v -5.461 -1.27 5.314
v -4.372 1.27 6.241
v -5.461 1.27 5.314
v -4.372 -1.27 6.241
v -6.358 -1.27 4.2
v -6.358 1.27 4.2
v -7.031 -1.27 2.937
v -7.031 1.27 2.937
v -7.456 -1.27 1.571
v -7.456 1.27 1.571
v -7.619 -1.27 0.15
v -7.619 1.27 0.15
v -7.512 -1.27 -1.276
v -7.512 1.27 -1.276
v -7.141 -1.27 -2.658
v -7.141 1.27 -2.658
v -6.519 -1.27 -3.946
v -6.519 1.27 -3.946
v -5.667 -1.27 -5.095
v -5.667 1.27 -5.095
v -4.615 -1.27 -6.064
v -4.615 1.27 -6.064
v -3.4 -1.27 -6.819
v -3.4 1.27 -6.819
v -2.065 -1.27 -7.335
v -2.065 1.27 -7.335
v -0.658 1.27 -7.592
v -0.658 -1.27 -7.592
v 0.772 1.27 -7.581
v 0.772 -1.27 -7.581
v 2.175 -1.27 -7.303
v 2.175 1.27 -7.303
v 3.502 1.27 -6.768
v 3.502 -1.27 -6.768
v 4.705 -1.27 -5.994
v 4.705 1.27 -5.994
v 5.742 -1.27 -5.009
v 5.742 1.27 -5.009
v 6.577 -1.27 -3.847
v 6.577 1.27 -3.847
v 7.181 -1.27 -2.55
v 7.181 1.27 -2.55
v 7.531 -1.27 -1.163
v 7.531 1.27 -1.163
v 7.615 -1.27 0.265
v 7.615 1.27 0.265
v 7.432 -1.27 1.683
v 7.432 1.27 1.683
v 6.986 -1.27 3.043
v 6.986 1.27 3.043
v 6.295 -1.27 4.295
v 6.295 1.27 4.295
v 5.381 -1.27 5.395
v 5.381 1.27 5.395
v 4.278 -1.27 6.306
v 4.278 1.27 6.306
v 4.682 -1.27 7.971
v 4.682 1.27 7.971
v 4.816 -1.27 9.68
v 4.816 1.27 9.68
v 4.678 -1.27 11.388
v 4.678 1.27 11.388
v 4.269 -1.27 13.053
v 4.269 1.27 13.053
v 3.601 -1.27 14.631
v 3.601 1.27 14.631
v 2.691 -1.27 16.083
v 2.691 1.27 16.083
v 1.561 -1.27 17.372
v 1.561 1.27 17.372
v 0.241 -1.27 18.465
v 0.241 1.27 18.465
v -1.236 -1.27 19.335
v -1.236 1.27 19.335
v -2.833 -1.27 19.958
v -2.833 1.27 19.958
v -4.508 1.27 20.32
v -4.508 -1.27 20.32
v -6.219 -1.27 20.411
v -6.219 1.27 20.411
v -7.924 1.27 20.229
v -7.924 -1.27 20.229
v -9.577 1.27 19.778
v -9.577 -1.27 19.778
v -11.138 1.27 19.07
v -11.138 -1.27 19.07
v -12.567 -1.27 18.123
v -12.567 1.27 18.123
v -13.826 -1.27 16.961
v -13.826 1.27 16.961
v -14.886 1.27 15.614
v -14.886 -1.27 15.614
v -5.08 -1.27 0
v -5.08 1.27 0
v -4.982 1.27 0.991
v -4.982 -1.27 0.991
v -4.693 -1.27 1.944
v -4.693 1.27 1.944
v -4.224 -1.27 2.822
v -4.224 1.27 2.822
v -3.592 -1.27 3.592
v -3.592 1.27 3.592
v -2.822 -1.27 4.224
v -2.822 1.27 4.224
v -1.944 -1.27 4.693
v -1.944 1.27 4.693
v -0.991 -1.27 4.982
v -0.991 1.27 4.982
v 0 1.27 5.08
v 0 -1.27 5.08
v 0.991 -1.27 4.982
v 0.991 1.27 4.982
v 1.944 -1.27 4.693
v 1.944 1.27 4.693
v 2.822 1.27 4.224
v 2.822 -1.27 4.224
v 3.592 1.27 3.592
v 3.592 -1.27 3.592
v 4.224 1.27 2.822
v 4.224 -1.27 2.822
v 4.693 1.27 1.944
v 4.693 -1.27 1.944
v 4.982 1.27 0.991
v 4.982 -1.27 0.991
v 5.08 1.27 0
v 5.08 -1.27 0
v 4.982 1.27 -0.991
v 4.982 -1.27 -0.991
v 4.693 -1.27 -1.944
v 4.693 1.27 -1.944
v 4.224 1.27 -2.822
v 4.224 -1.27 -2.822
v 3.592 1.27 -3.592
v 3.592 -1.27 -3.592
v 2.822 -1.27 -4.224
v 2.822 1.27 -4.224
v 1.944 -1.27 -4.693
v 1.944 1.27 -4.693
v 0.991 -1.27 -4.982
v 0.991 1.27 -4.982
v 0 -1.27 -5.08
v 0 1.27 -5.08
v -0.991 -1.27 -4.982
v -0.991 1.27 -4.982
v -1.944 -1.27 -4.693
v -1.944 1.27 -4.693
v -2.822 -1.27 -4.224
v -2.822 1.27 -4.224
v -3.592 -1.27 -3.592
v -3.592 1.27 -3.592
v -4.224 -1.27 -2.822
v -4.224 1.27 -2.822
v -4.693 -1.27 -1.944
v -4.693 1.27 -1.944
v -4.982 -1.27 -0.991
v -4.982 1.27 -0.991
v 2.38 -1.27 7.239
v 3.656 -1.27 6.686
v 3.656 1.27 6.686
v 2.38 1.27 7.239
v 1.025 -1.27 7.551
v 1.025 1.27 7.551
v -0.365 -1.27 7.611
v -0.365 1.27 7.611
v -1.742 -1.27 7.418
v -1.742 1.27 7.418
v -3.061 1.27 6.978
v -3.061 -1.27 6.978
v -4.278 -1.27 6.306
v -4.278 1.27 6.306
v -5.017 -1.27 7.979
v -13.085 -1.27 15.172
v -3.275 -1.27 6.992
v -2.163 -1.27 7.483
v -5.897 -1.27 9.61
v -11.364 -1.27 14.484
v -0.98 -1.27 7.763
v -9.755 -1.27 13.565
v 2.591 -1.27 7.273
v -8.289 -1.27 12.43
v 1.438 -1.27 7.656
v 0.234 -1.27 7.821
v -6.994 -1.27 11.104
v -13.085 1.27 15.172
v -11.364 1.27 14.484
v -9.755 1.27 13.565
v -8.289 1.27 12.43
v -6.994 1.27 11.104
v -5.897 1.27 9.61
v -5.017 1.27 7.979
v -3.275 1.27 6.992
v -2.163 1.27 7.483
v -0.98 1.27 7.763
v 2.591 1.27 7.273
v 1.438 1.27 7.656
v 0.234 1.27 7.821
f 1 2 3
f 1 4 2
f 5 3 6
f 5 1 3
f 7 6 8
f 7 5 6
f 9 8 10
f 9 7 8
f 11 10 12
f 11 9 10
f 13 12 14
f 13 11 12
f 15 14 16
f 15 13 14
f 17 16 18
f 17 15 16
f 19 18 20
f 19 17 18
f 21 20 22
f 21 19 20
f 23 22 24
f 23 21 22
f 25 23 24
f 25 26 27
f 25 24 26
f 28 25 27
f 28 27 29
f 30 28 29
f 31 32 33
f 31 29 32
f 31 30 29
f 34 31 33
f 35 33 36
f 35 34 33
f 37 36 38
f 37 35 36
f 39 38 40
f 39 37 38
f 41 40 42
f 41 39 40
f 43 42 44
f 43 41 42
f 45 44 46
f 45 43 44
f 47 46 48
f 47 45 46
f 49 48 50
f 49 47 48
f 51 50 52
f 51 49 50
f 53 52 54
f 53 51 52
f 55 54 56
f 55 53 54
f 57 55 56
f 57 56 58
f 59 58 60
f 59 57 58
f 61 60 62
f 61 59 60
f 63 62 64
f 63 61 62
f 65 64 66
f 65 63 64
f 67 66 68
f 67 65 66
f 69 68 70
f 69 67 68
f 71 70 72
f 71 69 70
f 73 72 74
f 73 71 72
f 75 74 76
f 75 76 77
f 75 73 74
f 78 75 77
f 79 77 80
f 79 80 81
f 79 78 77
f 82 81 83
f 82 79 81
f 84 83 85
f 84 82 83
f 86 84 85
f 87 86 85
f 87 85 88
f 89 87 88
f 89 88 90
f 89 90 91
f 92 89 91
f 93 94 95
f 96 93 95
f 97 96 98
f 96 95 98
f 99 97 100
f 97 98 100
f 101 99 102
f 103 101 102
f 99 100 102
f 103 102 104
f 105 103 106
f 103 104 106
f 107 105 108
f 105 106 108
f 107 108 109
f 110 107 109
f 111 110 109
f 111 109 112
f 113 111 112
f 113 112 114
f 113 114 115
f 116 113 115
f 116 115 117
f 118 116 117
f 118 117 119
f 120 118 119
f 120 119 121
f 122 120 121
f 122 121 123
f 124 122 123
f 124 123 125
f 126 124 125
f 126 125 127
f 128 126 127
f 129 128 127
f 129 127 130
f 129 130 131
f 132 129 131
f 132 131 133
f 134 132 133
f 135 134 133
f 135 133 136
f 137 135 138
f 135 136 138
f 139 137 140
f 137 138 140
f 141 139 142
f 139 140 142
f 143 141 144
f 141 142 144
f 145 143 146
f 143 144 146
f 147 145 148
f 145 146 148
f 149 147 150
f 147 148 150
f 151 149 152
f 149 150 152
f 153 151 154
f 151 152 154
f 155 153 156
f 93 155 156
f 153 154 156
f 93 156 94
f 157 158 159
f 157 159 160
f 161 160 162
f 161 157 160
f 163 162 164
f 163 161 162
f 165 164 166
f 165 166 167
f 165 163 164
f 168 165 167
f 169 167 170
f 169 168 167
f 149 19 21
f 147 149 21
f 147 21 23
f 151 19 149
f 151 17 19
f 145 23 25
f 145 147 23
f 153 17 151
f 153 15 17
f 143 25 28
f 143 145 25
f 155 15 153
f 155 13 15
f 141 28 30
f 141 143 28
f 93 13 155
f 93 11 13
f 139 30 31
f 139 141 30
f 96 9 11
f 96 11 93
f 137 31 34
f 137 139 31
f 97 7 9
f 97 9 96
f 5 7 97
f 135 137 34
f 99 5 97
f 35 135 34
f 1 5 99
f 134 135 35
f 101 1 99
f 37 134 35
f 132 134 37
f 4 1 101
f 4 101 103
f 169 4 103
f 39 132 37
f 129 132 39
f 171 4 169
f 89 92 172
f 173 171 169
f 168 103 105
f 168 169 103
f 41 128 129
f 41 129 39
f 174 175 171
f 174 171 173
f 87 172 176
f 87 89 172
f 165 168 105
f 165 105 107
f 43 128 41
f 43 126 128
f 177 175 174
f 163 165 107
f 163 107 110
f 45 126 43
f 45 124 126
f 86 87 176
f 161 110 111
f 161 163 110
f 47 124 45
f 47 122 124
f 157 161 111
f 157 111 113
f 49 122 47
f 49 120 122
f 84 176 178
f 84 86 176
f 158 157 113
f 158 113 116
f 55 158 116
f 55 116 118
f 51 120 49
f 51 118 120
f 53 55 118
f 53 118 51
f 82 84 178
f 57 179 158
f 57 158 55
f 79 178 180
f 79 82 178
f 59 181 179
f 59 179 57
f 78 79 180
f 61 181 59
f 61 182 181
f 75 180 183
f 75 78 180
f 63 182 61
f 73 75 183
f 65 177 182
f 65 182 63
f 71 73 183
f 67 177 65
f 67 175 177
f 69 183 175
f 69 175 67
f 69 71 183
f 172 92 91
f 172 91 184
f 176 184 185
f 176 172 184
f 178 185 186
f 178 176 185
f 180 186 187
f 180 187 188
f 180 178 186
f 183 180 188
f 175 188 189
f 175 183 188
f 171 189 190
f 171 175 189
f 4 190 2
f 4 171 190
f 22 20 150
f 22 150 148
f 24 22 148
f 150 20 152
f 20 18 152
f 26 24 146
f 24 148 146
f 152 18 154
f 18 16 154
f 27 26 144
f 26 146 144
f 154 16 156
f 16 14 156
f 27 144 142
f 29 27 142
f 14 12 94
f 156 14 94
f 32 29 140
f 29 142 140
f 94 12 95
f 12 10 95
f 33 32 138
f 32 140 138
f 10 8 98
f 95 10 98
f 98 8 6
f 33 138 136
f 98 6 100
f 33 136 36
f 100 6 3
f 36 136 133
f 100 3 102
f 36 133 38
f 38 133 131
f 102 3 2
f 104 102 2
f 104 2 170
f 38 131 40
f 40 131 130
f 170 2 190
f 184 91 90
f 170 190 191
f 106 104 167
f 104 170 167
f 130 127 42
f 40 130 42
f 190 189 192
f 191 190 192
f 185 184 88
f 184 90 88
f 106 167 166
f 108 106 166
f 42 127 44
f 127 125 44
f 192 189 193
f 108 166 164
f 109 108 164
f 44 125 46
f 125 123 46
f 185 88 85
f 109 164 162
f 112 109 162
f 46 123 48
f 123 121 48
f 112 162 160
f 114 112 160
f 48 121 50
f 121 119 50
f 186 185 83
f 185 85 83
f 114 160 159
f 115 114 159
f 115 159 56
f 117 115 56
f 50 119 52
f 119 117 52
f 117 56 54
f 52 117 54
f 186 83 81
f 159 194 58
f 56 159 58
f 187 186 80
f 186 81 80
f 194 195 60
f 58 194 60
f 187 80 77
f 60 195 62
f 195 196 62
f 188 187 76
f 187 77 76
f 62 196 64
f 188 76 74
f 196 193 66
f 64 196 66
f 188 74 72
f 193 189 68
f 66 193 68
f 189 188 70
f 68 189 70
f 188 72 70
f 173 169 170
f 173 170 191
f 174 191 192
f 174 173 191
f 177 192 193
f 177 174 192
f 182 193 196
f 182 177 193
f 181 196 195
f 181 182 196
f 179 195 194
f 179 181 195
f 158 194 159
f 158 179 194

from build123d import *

# Parameters (mm, degrees)
F0_R     = 7.62
F1_DEPTH = 1.27
F3_D     = 10.16
F5_DEPTH = 1.27


# Not quite as in the source:
# - a feature names something its author has since deleted; it is built from what else it names


with BuildPart() as f1:
    # F0 (on Front) → F1 (new body, symmetric)
    with BuildSketch(Plane.XZ):
        Circle(F0_R)
    extrude(amount=F1_DEPTH, both=True)

    # F3 (through all)
    with Locations(Plane.XZ.offset(1.27)):
        with Locations((0, 0)):
            Hole(F3_D / 2)

    # F4 (on Front) → F5 (join, symmetric)
    with BuildSketch(Plane.XZ):
        with BuildLine():
            ThreePointArc((-4.368594382, 6.2292921357), (-0.0581857965, 7.8272864293), (4.2522227889, 6.2292921357))
            ThreePointArc((4.2522227889, 6.2292921357), (-1.1998943931, 19.3169425848), (-14.8855810985, 15.6136797741))
            ThreePointArc((-14.8855810985, 15.6136797741), (-8.2843431722, 12.4262859834), (-4.368594382, 6.2292921357))
        make_face()
    extrude(amount=F5_DEPTH, both=True)


solid = f1.part
